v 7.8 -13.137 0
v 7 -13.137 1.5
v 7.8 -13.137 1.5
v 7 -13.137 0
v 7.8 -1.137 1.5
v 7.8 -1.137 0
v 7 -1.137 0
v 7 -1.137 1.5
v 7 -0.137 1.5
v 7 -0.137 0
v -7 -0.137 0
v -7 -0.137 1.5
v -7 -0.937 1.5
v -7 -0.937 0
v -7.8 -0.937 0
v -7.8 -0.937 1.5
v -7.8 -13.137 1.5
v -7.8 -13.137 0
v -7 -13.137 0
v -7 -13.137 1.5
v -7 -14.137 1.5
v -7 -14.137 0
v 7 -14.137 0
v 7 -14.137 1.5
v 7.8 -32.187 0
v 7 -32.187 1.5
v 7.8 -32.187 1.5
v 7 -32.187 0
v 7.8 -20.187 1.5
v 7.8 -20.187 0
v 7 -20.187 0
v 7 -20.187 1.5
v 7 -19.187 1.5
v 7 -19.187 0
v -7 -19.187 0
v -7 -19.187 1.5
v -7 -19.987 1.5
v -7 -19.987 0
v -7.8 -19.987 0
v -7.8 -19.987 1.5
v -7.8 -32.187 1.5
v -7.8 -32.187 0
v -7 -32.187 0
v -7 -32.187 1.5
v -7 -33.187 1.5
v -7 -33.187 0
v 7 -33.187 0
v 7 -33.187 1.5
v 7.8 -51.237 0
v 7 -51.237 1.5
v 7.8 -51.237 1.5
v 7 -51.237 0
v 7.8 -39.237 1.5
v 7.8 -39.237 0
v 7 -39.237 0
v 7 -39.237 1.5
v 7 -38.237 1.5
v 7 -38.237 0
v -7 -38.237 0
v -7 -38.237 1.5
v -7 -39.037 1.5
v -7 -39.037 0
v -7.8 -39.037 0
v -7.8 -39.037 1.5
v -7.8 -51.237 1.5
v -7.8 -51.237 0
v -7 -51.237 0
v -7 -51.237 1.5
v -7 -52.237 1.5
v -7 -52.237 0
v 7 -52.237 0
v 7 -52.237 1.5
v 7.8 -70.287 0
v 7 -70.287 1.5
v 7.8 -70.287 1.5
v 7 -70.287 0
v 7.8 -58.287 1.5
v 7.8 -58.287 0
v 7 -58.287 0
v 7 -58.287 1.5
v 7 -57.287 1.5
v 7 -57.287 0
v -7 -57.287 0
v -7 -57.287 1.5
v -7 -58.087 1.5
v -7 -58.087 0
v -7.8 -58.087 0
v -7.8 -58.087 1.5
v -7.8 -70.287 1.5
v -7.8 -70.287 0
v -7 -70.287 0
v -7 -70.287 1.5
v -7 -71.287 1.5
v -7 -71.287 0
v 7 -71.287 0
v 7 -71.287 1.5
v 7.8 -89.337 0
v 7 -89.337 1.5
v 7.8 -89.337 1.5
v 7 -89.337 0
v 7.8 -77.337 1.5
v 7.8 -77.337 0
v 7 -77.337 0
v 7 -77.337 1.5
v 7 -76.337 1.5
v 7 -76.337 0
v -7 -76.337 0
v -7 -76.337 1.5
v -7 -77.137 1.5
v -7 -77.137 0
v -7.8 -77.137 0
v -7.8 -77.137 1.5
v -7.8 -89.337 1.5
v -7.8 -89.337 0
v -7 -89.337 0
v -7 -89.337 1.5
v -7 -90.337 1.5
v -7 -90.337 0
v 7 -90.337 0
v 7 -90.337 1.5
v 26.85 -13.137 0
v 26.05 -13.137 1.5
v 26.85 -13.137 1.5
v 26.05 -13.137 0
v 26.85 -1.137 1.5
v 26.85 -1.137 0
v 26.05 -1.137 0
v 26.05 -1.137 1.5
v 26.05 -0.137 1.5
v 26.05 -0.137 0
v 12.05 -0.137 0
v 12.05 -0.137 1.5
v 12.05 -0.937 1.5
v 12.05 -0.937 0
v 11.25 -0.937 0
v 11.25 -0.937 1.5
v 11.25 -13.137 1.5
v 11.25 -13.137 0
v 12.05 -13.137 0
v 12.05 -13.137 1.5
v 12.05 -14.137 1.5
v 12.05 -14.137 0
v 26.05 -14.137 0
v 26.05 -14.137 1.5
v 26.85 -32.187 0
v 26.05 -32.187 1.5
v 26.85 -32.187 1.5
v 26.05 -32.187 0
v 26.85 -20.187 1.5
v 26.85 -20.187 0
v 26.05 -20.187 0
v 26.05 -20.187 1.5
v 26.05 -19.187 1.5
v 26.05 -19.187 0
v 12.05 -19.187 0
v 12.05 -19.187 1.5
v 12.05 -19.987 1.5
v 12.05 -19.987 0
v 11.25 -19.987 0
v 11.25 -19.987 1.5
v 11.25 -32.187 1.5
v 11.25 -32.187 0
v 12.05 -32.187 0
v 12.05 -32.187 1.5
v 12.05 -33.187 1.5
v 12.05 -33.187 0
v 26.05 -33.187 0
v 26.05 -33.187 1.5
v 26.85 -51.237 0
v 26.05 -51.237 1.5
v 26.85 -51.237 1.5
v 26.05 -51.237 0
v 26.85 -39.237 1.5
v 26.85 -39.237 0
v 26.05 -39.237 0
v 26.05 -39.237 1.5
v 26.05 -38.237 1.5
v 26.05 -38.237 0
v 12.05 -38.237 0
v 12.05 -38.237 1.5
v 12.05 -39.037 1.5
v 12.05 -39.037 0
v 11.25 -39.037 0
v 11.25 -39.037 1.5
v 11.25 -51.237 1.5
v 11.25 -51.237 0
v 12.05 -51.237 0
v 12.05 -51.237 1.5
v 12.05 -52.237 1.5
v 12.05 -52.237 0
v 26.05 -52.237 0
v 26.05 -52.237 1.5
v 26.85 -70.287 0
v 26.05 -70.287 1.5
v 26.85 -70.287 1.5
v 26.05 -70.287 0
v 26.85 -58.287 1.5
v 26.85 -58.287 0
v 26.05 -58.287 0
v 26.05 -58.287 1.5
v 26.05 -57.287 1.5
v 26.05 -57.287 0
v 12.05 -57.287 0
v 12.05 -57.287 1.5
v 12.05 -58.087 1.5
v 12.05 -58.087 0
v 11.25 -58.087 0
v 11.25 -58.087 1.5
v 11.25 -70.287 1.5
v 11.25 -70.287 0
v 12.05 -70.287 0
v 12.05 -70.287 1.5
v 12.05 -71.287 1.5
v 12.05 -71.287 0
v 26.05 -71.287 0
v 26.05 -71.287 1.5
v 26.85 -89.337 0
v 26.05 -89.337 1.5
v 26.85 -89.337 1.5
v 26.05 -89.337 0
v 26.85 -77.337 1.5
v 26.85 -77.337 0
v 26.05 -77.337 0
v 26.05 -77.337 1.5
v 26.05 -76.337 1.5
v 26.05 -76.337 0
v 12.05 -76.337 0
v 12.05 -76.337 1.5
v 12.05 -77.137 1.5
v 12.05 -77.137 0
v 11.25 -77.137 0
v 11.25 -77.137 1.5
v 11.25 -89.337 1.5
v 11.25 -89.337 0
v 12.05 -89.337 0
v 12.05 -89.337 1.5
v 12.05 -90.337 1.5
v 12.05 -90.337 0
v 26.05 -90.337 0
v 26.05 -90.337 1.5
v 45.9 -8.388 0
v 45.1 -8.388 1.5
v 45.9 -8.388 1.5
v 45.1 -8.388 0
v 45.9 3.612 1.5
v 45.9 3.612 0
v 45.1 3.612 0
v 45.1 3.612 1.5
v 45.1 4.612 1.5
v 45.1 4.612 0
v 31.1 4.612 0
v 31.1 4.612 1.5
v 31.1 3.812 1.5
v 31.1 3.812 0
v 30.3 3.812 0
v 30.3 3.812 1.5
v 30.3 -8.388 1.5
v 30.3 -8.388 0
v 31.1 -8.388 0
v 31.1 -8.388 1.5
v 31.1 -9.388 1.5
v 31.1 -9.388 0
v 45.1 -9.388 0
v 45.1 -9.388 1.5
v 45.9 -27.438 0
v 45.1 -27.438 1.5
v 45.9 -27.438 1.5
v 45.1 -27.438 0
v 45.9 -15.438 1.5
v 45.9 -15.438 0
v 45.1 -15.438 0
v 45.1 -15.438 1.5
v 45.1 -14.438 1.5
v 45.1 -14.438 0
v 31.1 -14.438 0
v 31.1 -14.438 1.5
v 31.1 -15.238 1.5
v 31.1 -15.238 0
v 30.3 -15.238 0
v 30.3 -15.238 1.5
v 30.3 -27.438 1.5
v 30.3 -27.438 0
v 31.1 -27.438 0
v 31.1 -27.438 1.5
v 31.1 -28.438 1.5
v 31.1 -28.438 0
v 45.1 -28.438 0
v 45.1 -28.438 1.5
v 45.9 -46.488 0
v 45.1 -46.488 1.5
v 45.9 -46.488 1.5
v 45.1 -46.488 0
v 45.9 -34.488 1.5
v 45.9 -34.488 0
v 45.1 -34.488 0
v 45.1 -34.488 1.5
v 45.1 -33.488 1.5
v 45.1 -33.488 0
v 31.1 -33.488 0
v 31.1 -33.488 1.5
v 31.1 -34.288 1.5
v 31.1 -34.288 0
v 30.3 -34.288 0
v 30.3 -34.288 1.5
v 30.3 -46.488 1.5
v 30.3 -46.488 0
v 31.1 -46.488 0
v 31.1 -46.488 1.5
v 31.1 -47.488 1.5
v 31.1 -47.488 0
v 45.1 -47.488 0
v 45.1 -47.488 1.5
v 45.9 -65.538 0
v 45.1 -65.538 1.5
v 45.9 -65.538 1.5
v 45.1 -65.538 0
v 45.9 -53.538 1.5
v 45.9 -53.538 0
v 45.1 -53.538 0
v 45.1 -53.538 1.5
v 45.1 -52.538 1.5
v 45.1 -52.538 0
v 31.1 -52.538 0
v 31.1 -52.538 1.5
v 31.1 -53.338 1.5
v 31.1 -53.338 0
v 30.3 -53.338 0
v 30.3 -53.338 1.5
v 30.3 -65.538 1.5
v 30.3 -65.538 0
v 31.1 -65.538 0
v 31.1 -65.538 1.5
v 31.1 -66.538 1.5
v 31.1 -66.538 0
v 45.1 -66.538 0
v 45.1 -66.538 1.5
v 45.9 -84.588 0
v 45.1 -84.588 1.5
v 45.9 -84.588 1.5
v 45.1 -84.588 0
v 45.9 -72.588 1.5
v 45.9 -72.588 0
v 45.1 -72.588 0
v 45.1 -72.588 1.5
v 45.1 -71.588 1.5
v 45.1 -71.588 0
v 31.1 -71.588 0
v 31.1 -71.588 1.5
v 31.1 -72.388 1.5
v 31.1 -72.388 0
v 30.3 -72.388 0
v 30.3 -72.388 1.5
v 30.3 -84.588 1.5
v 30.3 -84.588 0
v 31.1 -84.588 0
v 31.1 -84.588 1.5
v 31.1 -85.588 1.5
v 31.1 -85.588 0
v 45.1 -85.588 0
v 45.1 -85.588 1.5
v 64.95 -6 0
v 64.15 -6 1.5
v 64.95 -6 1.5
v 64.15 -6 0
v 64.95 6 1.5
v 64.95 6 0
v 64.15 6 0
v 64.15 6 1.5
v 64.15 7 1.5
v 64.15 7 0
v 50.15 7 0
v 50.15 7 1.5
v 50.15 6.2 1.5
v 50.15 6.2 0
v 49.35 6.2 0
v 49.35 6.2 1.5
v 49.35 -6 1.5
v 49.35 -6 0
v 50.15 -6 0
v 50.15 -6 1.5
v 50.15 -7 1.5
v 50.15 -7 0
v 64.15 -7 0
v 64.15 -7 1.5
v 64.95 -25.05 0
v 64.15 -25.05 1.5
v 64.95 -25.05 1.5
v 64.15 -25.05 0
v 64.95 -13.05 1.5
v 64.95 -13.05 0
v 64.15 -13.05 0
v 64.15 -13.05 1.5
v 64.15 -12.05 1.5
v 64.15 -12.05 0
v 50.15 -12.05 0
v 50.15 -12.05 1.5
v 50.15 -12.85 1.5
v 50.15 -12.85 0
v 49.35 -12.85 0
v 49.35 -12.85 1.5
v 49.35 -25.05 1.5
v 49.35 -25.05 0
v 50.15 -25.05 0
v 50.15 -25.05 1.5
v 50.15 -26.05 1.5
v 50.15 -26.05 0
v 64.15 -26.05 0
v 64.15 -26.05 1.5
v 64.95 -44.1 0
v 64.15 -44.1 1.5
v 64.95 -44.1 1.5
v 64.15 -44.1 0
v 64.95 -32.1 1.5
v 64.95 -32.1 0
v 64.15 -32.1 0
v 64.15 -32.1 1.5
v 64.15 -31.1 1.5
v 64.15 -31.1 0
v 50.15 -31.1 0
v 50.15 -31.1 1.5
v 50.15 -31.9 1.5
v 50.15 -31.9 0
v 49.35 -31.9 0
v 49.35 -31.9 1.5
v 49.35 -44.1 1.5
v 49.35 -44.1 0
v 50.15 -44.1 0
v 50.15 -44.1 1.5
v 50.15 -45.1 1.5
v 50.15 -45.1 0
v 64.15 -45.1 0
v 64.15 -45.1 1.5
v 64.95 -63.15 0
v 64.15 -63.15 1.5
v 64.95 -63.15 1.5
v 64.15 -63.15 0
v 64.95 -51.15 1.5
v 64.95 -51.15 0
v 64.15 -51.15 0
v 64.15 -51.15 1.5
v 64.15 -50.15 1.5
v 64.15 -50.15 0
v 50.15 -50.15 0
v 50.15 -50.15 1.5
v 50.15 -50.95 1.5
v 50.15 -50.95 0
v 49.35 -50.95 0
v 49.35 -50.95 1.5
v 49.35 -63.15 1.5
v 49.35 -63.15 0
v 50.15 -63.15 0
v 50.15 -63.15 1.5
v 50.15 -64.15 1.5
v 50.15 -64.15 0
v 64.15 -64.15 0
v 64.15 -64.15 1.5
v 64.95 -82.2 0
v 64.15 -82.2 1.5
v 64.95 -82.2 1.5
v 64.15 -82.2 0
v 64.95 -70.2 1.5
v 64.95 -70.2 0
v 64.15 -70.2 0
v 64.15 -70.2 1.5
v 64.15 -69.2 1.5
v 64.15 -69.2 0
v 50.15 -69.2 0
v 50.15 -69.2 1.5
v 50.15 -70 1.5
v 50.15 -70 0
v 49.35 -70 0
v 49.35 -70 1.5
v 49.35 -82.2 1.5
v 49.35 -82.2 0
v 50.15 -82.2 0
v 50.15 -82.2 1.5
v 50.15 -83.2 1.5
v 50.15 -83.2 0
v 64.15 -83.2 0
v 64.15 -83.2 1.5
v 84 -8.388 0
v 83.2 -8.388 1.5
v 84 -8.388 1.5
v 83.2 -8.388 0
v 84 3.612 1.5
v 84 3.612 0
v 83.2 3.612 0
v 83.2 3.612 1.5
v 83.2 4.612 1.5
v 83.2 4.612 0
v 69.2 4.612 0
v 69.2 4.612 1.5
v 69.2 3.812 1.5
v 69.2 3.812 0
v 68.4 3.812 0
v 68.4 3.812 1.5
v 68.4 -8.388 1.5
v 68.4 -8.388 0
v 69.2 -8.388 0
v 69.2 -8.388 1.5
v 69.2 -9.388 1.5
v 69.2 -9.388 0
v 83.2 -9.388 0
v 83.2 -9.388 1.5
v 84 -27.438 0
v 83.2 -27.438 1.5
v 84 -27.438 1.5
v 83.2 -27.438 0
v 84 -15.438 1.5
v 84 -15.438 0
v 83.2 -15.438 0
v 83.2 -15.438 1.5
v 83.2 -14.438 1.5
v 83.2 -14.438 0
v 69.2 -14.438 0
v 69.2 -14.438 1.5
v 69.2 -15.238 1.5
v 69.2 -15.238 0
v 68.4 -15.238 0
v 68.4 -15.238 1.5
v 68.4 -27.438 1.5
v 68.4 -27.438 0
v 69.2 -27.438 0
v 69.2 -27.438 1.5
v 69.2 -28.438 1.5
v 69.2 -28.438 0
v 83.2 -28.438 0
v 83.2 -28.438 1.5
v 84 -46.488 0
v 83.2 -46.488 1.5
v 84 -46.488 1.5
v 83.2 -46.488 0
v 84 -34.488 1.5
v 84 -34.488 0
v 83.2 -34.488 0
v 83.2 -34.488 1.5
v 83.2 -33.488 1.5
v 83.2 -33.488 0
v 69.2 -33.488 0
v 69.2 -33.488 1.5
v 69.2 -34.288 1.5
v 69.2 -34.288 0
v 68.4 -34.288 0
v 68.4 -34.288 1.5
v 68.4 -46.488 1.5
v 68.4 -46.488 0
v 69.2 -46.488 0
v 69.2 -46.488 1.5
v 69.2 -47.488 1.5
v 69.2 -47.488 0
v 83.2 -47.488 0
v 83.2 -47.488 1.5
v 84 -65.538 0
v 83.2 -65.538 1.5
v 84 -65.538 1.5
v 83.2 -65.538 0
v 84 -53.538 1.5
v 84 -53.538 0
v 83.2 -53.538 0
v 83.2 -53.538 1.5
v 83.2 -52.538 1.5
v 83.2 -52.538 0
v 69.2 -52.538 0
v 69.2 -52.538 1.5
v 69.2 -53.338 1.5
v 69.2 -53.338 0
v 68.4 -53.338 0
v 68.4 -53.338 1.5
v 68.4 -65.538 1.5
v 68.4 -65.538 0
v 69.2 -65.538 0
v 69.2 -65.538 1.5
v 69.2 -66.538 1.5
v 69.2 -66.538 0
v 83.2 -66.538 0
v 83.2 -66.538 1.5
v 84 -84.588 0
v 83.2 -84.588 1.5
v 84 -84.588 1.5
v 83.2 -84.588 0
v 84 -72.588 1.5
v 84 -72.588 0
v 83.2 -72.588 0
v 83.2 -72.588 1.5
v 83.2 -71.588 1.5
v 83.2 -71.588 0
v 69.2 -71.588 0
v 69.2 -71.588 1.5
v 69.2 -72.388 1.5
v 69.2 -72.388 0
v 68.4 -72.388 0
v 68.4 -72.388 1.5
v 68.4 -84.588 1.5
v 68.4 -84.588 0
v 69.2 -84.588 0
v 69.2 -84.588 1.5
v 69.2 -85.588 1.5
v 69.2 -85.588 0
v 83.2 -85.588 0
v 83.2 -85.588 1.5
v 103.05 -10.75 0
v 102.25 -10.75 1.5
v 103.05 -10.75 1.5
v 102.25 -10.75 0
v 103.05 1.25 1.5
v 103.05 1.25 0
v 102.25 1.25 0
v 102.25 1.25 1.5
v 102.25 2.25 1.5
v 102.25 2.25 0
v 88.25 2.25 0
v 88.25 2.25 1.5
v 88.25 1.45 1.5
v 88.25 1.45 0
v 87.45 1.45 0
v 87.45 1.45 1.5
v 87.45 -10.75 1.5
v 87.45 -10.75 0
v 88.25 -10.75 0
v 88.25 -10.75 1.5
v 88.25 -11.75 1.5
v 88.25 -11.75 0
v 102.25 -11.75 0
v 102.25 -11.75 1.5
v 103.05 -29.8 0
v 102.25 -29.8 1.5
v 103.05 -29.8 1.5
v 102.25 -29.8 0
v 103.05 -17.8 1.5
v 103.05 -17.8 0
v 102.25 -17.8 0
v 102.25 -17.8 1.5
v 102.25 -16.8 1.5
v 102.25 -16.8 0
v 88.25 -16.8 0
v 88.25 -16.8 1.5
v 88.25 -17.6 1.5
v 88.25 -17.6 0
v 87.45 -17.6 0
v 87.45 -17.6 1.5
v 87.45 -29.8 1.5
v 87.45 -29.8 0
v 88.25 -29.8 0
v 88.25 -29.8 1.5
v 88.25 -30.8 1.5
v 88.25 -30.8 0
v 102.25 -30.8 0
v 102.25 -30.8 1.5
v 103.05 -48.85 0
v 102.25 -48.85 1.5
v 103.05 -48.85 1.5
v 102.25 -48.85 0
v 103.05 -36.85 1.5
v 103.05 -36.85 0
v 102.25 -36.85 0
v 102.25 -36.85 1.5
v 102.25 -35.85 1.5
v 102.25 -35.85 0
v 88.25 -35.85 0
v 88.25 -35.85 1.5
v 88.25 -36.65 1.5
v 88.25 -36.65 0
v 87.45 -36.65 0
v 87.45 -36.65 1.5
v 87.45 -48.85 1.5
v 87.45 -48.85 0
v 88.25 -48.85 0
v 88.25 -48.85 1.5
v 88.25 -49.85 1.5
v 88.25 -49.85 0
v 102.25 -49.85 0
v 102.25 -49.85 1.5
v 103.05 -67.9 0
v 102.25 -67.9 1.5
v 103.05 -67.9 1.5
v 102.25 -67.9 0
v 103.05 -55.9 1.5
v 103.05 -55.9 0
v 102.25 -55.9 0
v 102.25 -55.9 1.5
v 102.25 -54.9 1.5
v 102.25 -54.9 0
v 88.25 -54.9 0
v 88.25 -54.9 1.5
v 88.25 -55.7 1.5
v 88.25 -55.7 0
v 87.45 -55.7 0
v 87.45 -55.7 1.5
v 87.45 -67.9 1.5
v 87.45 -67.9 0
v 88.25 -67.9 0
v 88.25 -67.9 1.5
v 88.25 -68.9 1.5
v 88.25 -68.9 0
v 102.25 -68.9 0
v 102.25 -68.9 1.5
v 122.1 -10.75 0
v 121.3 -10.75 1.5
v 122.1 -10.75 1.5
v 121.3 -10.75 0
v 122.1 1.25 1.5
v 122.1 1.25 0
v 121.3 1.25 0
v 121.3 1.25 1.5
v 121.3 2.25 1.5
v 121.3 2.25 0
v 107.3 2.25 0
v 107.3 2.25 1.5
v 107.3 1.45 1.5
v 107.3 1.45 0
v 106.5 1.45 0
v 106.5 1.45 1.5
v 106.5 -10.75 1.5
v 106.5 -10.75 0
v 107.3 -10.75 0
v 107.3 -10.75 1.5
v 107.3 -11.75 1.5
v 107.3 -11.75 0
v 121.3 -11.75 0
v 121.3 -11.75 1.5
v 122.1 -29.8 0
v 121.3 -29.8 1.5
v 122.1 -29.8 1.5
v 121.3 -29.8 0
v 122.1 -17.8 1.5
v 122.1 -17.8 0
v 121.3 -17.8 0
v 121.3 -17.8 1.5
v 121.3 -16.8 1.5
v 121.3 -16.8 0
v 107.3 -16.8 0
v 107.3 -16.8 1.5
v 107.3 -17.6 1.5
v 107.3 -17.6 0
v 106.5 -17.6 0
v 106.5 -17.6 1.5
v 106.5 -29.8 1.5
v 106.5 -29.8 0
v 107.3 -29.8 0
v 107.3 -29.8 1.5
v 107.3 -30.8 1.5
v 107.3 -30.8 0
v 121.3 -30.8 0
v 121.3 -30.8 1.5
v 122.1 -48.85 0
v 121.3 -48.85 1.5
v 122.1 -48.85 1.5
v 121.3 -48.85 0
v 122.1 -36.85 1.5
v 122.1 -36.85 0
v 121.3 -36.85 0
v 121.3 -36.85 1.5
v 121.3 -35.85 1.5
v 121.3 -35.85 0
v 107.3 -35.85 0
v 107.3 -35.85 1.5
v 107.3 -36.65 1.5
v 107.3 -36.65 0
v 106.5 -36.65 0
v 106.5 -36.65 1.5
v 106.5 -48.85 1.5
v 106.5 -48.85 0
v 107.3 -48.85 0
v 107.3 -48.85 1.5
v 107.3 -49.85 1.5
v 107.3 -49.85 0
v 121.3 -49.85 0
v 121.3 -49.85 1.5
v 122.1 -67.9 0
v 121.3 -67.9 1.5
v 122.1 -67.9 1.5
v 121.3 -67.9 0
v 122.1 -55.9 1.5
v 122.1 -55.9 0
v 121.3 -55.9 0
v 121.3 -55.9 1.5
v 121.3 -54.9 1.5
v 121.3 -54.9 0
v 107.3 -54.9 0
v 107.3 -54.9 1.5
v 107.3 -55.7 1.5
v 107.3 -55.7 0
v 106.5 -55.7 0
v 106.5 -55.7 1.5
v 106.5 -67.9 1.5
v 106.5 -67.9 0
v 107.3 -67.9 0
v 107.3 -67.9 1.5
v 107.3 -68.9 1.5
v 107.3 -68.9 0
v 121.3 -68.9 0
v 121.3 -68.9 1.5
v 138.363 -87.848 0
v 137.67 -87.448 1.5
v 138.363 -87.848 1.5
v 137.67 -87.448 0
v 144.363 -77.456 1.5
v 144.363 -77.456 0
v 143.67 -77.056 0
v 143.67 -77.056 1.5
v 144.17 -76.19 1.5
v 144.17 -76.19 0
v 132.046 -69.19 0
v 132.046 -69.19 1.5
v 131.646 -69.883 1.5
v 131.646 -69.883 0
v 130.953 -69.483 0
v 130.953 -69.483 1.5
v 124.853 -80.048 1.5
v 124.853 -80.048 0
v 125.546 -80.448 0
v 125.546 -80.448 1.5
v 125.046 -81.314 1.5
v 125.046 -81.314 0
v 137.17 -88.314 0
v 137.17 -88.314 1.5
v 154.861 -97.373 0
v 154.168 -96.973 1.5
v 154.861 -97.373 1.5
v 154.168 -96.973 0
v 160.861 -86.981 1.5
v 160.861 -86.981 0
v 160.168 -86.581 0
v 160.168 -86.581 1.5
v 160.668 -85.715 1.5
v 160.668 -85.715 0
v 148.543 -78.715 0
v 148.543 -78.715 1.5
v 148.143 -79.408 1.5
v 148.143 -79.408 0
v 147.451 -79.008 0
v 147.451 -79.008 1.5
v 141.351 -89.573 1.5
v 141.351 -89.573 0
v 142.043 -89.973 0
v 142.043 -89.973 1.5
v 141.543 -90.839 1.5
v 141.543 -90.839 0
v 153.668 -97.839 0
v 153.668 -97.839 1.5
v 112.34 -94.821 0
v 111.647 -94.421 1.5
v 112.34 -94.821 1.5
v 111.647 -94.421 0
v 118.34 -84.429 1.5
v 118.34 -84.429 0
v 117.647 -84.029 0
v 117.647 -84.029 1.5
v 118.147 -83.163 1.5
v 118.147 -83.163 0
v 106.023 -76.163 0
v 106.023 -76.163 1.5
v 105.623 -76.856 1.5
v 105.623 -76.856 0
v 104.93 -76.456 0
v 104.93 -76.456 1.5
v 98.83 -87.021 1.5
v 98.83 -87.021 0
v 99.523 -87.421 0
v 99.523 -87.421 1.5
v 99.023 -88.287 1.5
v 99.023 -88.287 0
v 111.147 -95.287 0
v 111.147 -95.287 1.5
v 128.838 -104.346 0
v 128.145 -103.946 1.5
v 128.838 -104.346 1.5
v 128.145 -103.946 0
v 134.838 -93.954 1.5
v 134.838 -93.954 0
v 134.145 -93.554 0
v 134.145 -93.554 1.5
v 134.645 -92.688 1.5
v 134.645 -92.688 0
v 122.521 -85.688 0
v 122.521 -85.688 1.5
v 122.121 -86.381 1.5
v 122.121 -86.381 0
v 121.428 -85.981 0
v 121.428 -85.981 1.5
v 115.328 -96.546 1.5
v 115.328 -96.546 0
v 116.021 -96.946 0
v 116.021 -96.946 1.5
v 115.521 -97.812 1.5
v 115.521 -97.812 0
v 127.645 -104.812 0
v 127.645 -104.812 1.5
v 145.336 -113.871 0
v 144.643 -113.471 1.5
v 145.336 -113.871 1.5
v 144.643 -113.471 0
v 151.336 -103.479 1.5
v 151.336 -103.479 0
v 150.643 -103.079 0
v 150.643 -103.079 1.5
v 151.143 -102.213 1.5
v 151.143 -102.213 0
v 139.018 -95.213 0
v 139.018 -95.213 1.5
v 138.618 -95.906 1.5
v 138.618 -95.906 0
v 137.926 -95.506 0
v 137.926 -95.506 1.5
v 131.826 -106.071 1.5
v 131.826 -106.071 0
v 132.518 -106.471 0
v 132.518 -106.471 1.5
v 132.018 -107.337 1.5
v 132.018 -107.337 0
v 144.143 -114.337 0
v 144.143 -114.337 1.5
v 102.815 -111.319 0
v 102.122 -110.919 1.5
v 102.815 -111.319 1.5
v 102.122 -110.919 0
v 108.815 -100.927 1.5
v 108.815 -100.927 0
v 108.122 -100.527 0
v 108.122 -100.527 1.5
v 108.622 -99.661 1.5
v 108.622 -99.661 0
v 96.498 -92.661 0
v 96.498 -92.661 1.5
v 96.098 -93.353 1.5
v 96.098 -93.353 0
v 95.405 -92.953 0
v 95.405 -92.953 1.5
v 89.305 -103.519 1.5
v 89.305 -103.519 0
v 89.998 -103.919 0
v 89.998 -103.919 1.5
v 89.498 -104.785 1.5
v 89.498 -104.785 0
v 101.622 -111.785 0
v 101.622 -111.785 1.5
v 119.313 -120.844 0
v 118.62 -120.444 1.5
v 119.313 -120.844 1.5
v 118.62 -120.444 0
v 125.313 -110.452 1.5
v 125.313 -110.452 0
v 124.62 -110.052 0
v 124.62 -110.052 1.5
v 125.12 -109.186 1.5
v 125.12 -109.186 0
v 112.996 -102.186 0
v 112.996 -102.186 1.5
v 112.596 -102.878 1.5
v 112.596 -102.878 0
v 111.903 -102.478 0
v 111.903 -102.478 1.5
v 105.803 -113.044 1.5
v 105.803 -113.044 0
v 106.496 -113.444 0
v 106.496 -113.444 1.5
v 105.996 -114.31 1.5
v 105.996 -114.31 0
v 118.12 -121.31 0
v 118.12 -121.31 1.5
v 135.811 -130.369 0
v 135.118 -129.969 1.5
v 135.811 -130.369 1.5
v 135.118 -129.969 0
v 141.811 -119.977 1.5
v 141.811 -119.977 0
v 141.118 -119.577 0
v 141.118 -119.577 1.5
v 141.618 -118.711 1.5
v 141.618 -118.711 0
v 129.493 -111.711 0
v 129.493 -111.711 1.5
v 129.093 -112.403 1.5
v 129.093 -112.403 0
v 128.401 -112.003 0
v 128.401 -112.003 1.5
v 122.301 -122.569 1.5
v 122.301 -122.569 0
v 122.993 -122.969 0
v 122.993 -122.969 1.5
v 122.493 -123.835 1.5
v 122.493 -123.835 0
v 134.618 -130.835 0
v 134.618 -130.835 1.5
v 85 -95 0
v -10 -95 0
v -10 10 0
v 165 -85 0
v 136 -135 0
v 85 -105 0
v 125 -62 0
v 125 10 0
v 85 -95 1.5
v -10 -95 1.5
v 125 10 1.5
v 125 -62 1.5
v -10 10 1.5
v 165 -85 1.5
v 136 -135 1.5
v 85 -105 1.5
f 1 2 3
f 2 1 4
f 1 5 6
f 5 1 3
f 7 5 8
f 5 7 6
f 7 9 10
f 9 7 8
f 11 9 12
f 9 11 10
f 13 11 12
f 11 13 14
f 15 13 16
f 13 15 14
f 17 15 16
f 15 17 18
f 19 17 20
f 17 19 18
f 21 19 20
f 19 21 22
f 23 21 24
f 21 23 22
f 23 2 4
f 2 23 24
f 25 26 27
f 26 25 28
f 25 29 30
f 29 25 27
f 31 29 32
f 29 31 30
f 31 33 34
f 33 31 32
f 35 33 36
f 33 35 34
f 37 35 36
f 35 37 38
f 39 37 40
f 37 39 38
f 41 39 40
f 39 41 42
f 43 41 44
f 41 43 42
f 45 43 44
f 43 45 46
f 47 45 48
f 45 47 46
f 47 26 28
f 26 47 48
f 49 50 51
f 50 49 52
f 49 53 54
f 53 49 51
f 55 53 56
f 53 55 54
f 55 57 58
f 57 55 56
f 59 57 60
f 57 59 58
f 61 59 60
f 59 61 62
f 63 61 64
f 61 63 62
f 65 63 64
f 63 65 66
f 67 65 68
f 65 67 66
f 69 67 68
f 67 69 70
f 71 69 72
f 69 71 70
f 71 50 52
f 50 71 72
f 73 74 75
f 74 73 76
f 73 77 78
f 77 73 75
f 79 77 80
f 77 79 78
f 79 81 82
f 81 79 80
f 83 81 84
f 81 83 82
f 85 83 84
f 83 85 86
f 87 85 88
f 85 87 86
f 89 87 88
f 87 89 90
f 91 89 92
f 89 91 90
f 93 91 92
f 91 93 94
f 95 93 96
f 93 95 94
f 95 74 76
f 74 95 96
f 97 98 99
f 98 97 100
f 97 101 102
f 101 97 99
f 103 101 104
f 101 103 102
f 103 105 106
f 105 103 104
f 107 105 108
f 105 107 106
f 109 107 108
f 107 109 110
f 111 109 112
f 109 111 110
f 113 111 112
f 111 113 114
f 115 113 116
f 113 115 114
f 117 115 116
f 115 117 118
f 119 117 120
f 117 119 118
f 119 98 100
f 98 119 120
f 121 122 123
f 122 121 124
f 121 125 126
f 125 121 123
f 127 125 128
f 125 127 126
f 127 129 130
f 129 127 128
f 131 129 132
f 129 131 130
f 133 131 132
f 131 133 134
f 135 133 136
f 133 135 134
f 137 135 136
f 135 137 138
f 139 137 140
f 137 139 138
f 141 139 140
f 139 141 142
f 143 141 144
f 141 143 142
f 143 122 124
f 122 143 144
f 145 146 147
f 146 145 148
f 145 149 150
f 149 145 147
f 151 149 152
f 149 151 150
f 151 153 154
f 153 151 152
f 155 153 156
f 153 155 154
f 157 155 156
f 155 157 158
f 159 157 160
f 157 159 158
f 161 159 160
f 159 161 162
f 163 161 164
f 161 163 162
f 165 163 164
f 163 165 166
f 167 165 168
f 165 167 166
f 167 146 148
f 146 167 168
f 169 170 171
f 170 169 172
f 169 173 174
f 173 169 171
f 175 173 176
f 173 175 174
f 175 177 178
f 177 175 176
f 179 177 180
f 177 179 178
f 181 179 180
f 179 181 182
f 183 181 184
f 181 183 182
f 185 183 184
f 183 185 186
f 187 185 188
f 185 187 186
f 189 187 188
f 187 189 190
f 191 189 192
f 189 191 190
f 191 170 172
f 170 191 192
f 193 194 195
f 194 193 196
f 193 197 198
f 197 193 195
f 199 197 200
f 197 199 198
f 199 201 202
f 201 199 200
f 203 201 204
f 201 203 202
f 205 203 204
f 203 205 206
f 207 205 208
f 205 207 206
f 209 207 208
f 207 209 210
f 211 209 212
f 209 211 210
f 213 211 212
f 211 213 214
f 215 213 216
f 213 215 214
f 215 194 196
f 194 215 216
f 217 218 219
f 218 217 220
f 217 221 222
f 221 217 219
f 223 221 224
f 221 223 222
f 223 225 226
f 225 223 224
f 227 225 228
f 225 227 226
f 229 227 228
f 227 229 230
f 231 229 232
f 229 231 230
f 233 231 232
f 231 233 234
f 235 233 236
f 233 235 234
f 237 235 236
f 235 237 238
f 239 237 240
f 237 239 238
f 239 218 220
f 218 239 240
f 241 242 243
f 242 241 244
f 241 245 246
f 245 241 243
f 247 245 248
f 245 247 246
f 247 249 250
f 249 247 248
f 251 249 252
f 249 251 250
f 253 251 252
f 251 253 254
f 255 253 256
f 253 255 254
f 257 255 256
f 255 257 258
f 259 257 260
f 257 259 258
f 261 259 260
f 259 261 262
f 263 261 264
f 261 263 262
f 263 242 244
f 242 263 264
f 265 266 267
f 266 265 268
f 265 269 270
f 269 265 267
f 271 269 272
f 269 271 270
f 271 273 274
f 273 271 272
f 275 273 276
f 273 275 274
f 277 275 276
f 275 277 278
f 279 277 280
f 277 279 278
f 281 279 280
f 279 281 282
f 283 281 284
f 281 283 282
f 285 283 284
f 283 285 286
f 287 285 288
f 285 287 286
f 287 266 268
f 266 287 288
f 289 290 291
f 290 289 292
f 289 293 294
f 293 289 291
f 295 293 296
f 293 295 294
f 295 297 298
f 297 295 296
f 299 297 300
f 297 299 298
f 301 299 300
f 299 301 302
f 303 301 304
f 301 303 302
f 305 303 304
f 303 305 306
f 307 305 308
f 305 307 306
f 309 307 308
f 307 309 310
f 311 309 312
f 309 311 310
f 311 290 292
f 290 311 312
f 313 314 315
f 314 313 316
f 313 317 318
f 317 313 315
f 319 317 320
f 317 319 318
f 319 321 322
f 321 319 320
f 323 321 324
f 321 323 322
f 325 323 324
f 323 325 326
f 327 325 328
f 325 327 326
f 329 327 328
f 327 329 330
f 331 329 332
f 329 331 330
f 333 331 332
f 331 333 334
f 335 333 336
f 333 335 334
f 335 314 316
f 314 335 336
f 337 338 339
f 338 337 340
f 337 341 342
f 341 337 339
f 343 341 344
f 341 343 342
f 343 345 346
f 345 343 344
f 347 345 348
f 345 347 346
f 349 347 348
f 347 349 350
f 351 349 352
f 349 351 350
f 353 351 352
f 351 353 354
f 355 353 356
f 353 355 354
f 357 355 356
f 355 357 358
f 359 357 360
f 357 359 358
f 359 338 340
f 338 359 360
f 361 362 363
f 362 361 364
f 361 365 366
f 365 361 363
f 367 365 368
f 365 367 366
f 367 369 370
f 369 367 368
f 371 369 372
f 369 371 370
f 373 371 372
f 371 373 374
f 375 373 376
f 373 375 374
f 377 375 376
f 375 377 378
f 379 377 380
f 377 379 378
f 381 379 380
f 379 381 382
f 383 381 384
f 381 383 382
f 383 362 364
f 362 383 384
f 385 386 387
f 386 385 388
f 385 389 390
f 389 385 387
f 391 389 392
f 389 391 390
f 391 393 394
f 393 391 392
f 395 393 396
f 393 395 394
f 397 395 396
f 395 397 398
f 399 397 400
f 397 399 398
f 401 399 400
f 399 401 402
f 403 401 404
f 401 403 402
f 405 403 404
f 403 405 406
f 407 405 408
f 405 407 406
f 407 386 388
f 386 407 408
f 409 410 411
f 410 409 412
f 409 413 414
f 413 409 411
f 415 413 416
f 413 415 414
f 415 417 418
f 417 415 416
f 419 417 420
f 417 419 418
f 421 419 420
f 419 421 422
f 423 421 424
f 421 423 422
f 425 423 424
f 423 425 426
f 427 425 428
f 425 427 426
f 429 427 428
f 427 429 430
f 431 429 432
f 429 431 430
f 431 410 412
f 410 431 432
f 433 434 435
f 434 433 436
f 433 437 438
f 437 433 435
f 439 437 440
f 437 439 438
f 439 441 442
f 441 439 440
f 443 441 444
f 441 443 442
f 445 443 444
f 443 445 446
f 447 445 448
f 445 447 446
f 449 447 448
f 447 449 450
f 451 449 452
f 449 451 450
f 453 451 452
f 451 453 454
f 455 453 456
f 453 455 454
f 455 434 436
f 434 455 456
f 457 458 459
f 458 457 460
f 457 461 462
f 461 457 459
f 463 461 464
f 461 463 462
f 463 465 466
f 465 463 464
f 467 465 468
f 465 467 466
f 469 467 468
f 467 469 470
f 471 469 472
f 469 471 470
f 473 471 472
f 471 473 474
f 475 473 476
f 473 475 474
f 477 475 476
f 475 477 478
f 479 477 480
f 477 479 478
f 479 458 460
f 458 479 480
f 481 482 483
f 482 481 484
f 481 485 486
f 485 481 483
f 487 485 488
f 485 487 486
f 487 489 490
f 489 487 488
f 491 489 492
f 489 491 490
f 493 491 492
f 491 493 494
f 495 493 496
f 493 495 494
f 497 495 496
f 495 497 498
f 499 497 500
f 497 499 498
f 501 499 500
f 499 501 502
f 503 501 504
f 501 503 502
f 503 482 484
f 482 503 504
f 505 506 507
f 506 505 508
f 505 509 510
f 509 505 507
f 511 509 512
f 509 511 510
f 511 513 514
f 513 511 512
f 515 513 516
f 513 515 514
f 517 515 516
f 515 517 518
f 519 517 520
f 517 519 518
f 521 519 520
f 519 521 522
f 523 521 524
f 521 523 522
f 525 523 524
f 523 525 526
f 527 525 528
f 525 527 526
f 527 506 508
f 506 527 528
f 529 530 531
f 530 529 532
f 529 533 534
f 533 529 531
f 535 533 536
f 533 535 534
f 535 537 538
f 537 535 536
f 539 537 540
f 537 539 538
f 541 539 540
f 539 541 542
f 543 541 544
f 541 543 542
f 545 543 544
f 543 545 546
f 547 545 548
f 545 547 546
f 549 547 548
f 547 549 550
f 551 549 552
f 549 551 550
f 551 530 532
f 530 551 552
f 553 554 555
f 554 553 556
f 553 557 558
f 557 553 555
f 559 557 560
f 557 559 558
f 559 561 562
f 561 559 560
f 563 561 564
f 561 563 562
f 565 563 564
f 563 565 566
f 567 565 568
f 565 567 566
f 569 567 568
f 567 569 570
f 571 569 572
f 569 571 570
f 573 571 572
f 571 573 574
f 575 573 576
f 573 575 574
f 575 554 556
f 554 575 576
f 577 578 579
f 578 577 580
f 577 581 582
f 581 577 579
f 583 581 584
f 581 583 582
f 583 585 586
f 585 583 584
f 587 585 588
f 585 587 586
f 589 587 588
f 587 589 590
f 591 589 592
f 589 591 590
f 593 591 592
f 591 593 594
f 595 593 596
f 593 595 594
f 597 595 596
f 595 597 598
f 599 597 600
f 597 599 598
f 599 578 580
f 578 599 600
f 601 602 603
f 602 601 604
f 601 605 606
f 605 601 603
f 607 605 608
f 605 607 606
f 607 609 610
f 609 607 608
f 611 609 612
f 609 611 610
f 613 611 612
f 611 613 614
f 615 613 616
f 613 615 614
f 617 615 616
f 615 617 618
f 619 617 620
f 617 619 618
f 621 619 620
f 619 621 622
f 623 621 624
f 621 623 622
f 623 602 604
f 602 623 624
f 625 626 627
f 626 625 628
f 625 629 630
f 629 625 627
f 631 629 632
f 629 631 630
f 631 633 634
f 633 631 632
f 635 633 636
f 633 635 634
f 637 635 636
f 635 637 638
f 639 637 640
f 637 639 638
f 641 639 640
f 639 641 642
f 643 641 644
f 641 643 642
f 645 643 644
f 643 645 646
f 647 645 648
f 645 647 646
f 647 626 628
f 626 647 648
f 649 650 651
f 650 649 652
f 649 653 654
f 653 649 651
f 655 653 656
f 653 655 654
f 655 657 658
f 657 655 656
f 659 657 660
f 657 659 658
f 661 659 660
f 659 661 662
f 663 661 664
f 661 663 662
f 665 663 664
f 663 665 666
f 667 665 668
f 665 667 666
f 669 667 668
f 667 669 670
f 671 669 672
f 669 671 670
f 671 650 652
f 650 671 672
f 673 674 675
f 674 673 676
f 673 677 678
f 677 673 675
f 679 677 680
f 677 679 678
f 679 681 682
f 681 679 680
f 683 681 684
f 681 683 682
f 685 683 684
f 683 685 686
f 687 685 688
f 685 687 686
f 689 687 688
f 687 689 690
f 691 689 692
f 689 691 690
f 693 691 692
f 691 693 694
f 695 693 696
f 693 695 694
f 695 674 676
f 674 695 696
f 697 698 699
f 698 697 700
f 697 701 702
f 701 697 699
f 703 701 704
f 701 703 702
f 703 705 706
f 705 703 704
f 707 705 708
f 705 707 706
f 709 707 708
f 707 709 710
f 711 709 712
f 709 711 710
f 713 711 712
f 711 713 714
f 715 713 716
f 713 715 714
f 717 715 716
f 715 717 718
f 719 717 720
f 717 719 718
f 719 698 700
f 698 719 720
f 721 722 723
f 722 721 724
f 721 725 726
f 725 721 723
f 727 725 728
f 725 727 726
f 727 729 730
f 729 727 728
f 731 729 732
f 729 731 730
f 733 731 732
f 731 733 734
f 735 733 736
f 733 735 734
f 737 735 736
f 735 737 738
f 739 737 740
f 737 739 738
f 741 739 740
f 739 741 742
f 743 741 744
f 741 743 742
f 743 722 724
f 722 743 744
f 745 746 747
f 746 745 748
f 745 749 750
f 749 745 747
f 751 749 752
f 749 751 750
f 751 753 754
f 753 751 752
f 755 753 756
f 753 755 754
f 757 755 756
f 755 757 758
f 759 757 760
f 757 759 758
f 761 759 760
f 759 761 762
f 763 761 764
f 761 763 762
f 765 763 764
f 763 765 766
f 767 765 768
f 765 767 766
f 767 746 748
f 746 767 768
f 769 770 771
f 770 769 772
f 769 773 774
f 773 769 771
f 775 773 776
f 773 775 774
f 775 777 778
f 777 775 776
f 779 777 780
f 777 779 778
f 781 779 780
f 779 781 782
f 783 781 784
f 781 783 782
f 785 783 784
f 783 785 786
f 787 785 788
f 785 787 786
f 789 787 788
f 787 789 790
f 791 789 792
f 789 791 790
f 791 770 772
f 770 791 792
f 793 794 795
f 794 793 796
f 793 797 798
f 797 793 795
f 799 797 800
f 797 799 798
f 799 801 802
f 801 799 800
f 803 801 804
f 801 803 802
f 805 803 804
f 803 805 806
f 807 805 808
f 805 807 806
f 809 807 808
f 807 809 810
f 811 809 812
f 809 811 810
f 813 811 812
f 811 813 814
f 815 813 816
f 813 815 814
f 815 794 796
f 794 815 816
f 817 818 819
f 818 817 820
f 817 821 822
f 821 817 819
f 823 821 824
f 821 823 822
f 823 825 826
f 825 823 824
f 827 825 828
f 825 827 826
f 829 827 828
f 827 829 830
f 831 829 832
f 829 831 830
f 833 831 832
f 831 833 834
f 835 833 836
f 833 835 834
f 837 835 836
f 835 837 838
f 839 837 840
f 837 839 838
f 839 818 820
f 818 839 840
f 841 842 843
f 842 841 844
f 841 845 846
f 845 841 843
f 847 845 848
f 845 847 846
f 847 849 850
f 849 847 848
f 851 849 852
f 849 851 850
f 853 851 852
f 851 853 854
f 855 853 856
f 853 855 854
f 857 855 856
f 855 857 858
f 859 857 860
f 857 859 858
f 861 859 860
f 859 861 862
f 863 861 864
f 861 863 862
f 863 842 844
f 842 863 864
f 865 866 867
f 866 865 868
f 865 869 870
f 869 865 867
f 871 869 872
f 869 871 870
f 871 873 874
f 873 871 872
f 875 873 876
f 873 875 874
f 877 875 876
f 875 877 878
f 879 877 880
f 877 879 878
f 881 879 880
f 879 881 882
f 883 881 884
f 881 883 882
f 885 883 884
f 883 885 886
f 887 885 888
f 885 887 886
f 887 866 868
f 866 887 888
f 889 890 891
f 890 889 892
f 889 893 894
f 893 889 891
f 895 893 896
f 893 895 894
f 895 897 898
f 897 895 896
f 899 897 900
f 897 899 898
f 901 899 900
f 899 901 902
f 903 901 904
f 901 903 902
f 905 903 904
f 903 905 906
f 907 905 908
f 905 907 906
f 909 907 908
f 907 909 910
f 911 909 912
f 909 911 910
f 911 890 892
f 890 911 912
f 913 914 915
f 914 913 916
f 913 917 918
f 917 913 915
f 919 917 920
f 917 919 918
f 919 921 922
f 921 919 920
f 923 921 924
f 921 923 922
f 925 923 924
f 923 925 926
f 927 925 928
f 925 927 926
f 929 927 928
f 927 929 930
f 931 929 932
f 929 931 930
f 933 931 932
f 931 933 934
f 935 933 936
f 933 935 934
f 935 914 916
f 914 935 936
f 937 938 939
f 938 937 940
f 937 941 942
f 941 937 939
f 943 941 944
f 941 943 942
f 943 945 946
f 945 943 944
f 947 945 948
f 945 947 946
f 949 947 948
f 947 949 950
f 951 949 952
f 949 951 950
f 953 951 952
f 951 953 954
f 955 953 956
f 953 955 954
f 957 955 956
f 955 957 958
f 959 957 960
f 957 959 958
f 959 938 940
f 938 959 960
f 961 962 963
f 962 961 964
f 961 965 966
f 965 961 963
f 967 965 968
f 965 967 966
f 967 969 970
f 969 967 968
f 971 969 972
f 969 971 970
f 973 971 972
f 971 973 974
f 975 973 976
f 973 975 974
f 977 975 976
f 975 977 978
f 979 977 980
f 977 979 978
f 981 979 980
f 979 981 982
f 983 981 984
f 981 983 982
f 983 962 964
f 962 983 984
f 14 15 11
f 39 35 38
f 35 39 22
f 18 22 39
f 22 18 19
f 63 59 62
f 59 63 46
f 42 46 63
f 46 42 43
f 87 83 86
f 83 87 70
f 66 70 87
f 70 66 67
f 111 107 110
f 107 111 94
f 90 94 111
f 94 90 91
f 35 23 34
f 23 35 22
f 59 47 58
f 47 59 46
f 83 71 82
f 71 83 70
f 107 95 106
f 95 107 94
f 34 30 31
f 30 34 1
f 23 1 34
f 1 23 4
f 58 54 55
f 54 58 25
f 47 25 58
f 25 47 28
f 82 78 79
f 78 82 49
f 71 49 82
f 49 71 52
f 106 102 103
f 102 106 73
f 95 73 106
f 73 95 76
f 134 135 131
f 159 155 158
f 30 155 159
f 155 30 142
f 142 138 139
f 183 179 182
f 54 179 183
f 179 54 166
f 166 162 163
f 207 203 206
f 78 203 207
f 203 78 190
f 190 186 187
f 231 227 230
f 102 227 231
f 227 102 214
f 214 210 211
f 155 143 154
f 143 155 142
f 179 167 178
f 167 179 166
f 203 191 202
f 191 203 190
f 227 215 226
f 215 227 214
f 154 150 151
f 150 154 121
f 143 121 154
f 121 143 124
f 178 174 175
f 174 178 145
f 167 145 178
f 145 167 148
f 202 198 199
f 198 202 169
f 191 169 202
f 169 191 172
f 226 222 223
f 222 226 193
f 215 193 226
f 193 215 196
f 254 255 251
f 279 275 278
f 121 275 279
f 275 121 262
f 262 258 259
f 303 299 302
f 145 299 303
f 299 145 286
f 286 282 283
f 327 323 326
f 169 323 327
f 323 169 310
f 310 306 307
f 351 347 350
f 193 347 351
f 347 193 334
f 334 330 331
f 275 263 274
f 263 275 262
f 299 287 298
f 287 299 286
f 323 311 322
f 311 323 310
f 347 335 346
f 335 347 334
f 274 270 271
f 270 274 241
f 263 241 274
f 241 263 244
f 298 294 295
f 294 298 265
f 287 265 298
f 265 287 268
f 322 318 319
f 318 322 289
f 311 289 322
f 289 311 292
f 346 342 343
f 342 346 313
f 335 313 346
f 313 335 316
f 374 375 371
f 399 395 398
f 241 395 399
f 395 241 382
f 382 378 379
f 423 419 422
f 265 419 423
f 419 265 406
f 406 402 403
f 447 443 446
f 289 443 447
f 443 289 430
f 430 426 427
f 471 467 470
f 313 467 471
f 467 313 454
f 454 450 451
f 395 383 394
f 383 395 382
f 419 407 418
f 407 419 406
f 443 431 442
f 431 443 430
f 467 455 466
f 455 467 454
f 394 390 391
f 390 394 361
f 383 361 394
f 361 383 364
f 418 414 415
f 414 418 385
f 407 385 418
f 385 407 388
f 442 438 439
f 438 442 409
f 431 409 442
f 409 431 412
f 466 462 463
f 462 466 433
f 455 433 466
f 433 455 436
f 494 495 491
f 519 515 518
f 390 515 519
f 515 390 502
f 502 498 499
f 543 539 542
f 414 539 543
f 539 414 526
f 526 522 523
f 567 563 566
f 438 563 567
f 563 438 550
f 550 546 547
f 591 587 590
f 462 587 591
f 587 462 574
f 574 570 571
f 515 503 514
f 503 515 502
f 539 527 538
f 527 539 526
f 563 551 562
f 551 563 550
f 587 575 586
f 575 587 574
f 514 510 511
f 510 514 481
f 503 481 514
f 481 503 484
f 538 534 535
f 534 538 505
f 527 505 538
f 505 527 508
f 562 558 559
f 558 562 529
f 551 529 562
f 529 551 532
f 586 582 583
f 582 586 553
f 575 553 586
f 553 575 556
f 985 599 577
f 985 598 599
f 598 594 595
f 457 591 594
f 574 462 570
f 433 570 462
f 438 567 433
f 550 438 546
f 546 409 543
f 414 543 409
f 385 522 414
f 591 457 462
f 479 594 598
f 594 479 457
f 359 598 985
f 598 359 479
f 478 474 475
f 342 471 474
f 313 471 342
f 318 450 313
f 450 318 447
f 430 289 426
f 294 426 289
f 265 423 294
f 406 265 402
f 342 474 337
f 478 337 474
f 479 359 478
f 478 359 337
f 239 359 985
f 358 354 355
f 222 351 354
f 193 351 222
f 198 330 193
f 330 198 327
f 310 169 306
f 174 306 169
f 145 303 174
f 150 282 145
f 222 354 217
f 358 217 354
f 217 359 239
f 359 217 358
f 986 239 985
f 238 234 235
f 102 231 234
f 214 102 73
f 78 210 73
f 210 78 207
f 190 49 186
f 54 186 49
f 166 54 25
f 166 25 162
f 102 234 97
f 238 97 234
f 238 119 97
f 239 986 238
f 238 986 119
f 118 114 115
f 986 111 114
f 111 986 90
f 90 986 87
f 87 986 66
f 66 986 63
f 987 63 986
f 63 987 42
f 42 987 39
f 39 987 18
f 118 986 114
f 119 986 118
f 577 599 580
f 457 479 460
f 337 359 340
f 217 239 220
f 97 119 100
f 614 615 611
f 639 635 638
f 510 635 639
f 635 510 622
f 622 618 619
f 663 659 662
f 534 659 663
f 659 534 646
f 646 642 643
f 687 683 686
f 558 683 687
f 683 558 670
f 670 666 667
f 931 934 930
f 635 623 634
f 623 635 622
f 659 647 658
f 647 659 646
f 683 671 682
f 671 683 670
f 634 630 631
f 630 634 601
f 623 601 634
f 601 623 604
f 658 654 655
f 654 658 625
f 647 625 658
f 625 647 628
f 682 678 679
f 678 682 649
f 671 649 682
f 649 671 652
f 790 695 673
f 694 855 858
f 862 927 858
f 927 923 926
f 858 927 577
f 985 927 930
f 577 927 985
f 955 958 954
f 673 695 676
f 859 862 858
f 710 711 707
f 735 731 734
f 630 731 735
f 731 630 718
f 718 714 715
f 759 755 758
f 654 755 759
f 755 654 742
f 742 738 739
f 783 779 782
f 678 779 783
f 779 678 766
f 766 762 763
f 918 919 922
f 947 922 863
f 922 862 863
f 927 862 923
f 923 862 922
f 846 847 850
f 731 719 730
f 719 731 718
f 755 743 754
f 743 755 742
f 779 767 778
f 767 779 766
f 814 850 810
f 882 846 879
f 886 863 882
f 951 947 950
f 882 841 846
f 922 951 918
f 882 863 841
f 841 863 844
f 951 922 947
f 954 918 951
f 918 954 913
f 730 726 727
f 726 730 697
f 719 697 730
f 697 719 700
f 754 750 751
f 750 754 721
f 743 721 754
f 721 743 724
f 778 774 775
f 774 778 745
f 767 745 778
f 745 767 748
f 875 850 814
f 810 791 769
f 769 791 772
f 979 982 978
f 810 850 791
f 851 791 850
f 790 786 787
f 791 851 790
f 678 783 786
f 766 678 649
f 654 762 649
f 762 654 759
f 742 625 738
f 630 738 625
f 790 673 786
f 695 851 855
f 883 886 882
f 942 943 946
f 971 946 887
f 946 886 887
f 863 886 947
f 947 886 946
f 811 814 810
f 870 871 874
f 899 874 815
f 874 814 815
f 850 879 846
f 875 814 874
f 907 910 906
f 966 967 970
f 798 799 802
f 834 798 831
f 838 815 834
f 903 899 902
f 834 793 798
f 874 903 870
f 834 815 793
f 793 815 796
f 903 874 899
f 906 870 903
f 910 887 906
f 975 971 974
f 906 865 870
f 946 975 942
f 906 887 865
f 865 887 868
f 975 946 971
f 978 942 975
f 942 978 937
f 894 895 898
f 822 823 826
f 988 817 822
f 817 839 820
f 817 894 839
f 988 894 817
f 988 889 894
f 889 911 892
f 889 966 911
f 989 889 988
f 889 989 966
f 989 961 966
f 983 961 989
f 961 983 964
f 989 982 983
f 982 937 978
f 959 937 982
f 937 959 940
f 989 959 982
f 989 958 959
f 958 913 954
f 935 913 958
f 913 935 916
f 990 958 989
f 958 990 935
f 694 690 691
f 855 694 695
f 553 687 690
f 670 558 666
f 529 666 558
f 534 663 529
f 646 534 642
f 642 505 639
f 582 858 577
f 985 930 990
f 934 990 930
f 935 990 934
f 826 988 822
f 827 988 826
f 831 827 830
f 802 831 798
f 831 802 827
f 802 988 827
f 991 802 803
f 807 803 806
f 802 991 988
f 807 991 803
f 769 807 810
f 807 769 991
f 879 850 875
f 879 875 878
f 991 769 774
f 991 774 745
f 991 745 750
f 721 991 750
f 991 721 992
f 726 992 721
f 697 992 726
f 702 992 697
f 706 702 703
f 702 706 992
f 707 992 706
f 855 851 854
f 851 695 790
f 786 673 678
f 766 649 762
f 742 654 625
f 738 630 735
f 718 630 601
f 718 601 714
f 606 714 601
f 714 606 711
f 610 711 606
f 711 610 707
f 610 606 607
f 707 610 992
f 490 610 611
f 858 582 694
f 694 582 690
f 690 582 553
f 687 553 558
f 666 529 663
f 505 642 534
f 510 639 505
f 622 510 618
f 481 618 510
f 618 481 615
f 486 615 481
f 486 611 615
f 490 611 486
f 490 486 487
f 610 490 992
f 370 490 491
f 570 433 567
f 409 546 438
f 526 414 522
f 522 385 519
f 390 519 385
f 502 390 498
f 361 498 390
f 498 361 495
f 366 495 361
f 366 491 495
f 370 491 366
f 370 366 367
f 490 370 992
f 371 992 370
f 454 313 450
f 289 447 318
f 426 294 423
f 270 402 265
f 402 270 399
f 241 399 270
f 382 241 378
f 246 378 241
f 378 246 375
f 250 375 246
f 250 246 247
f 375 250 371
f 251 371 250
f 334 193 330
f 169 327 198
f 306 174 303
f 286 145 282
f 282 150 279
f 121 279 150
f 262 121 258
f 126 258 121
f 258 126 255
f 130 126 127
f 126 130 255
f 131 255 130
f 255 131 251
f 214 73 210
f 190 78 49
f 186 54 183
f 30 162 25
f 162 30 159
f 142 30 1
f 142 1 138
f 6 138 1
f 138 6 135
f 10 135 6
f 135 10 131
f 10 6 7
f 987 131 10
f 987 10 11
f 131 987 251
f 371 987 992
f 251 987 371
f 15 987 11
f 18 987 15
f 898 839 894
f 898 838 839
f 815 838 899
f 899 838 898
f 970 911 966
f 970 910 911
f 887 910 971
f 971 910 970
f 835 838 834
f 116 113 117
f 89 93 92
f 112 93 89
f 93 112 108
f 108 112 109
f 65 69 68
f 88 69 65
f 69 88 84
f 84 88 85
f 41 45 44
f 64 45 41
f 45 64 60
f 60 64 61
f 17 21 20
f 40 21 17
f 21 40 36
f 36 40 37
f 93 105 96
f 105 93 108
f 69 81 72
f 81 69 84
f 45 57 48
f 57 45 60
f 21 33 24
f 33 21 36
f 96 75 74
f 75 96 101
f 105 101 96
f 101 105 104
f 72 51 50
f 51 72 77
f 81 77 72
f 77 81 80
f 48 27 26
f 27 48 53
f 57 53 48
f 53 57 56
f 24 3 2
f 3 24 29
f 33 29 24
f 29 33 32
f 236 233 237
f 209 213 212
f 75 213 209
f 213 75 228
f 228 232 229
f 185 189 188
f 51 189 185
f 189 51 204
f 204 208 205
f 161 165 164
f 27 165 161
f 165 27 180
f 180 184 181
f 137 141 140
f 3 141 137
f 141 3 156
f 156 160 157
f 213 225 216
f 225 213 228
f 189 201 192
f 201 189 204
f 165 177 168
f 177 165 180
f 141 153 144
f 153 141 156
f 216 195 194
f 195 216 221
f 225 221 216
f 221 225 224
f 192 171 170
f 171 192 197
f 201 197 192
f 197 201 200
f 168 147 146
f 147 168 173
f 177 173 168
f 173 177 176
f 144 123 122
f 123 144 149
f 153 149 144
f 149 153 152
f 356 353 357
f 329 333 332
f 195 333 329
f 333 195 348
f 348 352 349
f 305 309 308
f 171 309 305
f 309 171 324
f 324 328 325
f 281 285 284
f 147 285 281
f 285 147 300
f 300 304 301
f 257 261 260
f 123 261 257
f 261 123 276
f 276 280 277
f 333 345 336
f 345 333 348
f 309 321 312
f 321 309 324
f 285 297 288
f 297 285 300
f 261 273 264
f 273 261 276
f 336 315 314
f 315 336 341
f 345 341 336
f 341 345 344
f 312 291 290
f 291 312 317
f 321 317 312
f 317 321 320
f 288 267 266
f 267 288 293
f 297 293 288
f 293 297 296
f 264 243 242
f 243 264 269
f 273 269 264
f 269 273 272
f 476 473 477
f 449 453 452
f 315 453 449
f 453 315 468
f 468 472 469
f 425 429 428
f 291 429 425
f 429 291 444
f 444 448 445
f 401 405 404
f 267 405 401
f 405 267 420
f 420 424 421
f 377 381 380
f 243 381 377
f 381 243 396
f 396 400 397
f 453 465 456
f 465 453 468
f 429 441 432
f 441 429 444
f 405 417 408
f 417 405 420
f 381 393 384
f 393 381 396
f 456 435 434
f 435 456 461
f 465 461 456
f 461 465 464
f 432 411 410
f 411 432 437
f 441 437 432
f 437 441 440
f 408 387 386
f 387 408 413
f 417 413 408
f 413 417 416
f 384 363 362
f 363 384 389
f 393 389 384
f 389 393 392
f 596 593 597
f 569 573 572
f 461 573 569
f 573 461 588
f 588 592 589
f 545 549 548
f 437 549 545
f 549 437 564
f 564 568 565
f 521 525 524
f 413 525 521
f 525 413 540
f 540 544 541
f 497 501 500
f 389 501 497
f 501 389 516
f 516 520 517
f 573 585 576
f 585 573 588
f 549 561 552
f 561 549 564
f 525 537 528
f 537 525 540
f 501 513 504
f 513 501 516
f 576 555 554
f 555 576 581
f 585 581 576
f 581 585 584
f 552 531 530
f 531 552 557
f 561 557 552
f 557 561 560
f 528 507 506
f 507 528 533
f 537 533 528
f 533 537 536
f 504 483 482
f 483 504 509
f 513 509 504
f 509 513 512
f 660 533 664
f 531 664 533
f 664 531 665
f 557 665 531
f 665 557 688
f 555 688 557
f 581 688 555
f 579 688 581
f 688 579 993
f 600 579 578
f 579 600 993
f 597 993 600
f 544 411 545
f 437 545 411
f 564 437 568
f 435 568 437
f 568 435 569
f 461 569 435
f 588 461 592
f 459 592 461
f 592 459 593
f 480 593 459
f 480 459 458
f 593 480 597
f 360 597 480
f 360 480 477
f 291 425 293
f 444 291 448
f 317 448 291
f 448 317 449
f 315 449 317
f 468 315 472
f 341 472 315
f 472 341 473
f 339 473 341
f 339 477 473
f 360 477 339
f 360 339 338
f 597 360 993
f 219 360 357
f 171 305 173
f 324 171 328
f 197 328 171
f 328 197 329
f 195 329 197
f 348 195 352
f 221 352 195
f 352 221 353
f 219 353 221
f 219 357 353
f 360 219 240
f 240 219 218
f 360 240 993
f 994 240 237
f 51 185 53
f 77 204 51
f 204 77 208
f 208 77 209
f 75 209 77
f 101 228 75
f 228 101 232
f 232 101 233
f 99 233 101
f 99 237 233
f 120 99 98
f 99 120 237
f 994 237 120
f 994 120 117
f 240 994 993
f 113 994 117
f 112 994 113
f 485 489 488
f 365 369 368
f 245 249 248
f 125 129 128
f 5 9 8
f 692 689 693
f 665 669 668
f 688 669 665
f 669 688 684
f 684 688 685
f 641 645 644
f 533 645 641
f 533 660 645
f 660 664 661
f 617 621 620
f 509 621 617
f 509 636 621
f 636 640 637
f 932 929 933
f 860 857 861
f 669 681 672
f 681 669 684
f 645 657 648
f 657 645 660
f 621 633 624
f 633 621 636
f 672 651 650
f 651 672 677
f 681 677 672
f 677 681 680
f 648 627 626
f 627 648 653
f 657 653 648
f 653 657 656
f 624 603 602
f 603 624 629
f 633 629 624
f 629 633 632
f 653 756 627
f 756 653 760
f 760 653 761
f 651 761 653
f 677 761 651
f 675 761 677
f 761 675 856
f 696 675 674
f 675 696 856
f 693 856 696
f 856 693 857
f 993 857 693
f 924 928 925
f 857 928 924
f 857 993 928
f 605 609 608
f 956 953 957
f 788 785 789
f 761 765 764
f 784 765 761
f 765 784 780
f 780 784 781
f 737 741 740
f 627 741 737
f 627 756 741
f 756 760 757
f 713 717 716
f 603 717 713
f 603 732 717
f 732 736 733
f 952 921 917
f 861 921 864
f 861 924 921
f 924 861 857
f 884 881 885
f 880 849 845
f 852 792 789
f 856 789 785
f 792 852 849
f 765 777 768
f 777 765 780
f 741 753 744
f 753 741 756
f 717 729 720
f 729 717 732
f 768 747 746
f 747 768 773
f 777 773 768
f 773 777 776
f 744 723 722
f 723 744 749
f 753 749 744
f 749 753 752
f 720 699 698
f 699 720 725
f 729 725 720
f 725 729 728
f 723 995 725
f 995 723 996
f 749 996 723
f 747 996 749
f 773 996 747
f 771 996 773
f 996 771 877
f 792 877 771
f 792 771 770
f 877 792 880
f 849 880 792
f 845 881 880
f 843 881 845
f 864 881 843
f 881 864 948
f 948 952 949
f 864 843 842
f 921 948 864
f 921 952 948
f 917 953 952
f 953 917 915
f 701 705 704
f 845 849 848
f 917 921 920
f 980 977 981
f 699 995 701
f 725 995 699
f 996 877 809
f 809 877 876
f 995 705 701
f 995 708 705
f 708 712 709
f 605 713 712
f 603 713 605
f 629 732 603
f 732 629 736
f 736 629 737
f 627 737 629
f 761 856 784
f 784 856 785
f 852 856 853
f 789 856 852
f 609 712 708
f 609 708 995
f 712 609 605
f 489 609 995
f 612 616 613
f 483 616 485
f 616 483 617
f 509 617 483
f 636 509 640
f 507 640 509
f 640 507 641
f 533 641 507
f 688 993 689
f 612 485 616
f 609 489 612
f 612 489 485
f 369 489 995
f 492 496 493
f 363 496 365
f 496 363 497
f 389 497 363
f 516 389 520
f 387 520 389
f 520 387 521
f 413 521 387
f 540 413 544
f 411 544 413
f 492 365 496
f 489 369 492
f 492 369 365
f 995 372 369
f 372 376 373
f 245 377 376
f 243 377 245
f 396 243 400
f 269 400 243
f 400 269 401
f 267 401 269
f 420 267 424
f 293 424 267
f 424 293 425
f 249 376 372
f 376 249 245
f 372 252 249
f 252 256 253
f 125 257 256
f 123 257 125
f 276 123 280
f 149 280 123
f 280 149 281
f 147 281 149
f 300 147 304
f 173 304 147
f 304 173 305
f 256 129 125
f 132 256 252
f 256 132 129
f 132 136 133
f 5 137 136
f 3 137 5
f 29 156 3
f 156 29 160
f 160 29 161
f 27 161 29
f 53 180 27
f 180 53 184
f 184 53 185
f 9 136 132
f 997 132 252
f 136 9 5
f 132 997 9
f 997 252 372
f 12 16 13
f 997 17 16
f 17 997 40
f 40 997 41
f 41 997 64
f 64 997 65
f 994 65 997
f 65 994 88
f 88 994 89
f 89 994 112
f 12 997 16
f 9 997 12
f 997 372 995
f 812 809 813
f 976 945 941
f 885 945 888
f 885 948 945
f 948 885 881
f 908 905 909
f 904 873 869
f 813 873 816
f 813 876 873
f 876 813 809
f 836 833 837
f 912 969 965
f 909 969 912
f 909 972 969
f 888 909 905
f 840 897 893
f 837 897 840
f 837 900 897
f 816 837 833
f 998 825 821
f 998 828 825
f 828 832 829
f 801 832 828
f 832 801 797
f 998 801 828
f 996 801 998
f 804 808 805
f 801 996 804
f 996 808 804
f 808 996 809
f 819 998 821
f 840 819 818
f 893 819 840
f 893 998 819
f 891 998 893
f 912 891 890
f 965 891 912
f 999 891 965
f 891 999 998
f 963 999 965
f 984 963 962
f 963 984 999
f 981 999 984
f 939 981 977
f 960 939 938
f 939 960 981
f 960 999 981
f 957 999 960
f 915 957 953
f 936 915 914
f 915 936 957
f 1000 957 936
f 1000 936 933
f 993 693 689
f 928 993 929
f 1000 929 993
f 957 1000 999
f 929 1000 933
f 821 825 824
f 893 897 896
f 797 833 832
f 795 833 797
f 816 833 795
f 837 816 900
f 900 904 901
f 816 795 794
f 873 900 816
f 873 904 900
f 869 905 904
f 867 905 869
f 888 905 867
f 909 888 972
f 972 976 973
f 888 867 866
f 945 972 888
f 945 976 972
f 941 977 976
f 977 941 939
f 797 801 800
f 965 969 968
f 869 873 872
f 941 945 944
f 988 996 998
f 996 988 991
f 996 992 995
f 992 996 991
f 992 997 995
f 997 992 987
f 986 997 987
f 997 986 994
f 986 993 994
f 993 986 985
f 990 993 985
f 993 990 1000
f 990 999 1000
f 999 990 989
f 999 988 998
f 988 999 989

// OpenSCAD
// file: defs.scad
$fs=.01;

in2mm = 25.4;

keyPitch = 19.05;
cutoutWidth = 15.6;
cutoutHeight = 14;
cornerHeight = 1;
cornerWidth = .8;
plateThickness = 1.5;

r0 = 0;
r1 = -.094 * in2mm;
r2 = -.187 * in2mm;
r3 = -.281 * in2mm;

mainCols = [[5, r3], [5, r3], [5, r1], [5, r0], [5, r1], [4, r2],[4, r2]];


module point(c=[0,0]) {
    translate(concat(c, [0]))
        sphere(r=1);
}

module offset() {
    translate([keyPitch*5.7, -keyPitch*4.5, 0])
    rotate(-30) 
    children();
}

mainPoints = [
    for (i=[0:len(mainCols)-1])
       for (j=[0:mainCols[i][0]-1])
           [i*keyPitch, mainCols[i][1] - j*keyPitch]
    ];
       
clusterPoints = [[keyPitch, keyPitch], [2*keyPitch, keyPitch], [0, 0], [keyPitch, 0], [2*keyPitch, 0], [0, -keyPitch], [keyPitch, -keyPitch], [2*keyPitch, -keyPitch]];
       
    
   
// main file
include <defs.scad>;

module cutout(c) {
    x = c[0];
    y = c[1];
    w = cutoutWidth / 2;
    h = cutoutHeight / 2;
    cw = cornerWidth + 0;
    ch = cornerHeight + 0;
    linear_extrude(height=plateThickness*4, center=true)
        polygon([[x-w, y+h-cw], [x-w+cw, y+h-cw], [x-w+cw, y+h], [x+w-cw, y+h], [x+w-cw, y+h-ch], [x+w, y+h-ch], [x+w, y-h+ch], [x+w-cw, y-h+ch], [x+w-cw, y-h], [x-w+cw, y-h], [x-w+cw, y-h+ch], [x-w, y-h+ch]]);
}

difference(){
linear_extrude(height=plateThickness)
    polygon([[-10, 10], [125, 10], [125, -62], [165, -85], [136, -135], [85, -105], [85, -95], [-10, -95]]);

for (i=mainPoints) cutout(i);
offset() for (i=clusterPoints) cutout(i);
}
